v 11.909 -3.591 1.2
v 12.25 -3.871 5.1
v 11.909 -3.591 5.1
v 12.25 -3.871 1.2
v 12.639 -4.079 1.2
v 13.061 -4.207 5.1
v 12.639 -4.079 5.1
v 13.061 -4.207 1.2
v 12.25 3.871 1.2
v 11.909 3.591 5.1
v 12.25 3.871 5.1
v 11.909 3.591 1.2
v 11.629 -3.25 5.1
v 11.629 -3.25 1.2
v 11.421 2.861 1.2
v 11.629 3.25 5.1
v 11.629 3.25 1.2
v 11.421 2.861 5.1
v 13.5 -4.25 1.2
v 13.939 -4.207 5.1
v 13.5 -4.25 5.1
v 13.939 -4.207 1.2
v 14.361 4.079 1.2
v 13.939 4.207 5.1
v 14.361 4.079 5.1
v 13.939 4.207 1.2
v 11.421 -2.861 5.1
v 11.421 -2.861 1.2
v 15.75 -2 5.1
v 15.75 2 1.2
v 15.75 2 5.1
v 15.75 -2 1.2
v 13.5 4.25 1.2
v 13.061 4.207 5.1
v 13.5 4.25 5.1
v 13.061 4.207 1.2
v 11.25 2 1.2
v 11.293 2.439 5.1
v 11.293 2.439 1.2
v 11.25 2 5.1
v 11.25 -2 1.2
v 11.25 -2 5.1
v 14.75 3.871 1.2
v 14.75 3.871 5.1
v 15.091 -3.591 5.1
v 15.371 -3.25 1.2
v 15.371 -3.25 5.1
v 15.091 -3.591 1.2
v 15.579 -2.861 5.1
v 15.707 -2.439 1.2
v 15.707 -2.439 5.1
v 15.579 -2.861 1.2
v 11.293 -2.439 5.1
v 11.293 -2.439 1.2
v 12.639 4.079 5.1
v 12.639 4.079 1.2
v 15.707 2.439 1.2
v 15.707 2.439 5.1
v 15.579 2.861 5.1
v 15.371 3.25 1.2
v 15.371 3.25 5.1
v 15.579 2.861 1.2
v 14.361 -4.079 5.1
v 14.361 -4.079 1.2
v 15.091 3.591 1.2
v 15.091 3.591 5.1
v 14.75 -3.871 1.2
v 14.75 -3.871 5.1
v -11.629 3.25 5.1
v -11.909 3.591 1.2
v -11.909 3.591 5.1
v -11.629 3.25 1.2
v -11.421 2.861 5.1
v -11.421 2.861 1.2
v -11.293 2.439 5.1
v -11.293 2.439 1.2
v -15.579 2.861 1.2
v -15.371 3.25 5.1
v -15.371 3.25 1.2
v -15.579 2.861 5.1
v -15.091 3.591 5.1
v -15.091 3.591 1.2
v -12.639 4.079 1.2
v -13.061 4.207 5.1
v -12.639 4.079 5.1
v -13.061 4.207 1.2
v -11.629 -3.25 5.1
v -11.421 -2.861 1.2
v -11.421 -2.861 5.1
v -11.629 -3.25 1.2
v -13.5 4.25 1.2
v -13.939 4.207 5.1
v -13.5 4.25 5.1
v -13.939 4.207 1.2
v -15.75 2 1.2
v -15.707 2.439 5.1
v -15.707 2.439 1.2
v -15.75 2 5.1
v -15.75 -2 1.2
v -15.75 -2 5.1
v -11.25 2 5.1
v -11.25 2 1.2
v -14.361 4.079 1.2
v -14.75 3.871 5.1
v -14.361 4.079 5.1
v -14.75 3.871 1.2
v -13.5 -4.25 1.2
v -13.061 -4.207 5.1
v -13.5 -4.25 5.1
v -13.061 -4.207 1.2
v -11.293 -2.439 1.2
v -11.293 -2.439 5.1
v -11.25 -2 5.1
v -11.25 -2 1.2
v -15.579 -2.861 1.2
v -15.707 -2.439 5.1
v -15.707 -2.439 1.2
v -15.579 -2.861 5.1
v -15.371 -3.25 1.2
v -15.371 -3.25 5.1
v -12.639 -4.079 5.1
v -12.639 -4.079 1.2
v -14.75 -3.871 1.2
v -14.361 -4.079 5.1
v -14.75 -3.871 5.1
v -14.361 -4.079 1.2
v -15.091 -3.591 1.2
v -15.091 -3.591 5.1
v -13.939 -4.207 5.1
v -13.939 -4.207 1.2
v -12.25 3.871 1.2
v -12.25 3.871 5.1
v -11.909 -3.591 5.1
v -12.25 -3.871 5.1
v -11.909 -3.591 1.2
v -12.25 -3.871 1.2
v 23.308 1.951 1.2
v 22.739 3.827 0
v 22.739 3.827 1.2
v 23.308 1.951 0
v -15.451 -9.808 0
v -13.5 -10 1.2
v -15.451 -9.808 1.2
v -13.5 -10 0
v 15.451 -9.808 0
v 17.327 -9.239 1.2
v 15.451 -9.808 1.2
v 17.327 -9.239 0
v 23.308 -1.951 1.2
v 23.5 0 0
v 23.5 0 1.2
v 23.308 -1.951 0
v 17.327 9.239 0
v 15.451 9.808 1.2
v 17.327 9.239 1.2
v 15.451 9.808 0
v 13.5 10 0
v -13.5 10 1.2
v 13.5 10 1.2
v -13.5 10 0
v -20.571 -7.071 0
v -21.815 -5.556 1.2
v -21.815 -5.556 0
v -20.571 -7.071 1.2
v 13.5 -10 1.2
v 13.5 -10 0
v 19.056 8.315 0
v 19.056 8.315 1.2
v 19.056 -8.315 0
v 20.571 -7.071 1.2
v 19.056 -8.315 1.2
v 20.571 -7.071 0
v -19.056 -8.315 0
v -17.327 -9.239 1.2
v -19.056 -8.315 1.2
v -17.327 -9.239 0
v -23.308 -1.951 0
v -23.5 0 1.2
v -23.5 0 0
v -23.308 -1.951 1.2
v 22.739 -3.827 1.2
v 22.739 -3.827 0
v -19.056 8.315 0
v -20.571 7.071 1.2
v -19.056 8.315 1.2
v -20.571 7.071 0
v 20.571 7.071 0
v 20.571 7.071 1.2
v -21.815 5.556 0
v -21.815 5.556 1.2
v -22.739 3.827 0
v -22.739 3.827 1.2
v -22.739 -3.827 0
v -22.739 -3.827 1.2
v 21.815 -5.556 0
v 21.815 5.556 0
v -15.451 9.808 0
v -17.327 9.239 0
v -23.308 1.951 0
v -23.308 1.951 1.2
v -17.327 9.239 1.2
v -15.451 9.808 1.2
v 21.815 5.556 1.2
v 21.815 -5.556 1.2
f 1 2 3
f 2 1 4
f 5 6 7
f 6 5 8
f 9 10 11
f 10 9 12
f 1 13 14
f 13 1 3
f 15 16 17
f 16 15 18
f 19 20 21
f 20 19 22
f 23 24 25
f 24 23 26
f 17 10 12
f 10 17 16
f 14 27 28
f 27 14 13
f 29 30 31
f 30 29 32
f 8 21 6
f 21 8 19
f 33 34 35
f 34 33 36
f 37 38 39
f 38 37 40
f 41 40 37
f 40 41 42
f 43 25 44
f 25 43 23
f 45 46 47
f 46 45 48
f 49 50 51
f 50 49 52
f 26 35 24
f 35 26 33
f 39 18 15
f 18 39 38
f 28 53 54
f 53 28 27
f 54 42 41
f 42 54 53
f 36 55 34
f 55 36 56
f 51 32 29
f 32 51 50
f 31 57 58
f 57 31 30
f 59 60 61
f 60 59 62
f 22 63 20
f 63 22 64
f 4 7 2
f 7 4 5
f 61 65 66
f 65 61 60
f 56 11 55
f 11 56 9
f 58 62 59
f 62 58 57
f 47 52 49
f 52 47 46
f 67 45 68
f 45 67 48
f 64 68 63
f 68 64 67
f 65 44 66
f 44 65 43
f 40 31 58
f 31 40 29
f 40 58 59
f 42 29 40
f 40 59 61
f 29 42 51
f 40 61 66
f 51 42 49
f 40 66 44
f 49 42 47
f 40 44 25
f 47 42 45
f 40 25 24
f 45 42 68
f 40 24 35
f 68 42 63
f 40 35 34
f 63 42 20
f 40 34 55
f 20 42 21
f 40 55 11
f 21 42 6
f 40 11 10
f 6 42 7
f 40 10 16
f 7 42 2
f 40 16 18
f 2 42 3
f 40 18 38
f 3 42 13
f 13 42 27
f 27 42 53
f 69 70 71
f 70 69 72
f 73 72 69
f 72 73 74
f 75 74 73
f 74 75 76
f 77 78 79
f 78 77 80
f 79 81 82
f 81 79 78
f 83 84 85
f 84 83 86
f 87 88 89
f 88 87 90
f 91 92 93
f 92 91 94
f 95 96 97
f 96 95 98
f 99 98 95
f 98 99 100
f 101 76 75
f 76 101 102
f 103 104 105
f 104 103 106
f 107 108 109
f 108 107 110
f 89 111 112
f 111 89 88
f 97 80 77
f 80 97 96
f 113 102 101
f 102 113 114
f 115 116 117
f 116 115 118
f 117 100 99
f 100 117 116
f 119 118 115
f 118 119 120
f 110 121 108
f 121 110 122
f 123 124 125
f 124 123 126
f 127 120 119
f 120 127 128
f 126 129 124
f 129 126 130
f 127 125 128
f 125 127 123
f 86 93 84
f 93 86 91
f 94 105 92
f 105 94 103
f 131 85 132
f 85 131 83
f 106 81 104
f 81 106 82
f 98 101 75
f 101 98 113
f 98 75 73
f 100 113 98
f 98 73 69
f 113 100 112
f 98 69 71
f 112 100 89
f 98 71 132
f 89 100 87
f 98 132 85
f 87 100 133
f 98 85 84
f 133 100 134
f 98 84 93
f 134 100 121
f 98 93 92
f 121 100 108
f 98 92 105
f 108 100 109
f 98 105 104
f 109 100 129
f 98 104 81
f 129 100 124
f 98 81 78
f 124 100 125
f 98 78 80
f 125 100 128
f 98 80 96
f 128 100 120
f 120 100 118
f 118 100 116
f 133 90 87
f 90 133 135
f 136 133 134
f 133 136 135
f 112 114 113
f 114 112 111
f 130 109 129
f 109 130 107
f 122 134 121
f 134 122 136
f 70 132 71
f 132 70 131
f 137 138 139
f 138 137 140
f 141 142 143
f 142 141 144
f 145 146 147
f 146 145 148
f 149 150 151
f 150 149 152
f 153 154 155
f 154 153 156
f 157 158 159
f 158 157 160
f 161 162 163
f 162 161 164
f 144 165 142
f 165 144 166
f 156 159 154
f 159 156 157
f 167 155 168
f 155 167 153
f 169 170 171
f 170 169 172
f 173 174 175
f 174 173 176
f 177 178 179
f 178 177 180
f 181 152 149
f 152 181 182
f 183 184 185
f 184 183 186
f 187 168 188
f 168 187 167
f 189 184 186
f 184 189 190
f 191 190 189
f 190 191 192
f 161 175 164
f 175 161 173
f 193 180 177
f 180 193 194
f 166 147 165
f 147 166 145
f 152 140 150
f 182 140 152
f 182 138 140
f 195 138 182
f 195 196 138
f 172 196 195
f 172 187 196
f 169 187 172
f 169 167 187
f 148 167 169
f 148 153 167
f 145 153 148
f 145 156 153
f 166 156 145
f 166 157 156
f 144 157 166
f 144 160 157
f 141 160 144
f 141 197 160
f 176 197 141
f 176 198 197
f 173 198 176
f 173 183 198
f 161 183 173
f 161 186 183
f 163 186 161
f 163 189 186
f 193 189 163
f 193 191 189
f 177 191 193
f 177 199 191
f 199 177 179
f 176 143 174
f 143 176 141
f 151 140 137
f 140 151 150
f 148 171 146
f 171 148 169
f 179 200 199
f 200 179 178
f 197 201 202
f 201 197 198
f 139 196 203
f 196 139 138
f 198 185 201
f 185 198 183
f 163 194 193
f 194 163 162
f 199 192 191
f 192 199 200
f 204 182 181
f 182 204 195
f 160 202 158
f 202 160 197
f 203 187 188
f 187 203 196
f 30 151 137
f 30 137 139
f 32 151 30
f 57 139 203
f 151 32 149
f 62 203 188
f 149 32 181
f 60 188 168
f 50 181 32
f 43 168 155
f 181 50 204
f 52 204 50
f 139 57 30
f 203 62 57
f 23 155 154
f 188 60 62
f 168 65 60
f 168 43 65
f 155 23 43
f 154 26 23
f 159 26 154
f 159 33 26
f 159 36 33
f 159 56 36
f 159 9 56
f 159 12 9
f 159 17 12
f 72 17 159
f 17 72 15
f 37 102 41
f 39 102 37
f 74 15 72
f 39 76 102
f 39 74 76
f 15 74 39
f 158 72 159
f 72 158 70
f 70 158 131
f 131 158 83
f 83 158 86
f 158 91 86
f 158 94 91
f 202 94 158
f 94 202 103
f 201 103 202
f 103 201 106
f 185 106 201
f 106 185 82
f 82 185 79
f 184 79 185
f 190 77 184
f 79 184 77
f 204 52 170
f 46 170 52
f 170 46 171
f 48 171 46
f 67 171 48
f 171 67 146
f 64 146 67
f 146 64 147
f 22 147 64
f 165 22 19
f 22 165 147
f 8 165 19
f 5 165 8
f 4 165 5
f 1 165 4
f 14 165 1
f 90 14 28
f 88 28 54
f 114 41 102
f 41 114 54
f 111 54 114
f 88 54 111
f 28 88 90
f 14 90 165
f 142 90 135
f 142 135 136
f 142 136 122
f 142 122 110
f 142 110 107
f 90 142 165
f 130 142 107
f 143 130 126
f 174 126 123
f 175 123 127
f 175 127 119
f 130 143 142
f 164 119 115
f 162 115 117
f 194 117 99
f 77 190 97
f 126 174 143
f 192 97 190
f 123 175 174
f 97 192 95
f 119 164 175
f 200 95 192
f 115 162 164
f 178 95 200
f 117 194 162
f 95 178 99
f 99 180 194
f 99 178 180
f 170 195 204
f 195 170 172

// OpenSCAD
postH=4;
postD=27;
$fn=32;

translate([postD/2,0,1.2]) post();
translate([-postD/2,0,1.2]) post();

hull() {
  translate([postD/2,0,0]) cylinder(r=10,h=1.2);
  translate([-postD/2,0,0]) cylinder(r=10,h=1.2);
}

module post() {
  hull() {
    translate([0,2,-0.1]) cylinder(r=2.25, h=postH);
    translate([0,-2,-0.1]) cylinder(r=2.25, h=postH);
  }
}
